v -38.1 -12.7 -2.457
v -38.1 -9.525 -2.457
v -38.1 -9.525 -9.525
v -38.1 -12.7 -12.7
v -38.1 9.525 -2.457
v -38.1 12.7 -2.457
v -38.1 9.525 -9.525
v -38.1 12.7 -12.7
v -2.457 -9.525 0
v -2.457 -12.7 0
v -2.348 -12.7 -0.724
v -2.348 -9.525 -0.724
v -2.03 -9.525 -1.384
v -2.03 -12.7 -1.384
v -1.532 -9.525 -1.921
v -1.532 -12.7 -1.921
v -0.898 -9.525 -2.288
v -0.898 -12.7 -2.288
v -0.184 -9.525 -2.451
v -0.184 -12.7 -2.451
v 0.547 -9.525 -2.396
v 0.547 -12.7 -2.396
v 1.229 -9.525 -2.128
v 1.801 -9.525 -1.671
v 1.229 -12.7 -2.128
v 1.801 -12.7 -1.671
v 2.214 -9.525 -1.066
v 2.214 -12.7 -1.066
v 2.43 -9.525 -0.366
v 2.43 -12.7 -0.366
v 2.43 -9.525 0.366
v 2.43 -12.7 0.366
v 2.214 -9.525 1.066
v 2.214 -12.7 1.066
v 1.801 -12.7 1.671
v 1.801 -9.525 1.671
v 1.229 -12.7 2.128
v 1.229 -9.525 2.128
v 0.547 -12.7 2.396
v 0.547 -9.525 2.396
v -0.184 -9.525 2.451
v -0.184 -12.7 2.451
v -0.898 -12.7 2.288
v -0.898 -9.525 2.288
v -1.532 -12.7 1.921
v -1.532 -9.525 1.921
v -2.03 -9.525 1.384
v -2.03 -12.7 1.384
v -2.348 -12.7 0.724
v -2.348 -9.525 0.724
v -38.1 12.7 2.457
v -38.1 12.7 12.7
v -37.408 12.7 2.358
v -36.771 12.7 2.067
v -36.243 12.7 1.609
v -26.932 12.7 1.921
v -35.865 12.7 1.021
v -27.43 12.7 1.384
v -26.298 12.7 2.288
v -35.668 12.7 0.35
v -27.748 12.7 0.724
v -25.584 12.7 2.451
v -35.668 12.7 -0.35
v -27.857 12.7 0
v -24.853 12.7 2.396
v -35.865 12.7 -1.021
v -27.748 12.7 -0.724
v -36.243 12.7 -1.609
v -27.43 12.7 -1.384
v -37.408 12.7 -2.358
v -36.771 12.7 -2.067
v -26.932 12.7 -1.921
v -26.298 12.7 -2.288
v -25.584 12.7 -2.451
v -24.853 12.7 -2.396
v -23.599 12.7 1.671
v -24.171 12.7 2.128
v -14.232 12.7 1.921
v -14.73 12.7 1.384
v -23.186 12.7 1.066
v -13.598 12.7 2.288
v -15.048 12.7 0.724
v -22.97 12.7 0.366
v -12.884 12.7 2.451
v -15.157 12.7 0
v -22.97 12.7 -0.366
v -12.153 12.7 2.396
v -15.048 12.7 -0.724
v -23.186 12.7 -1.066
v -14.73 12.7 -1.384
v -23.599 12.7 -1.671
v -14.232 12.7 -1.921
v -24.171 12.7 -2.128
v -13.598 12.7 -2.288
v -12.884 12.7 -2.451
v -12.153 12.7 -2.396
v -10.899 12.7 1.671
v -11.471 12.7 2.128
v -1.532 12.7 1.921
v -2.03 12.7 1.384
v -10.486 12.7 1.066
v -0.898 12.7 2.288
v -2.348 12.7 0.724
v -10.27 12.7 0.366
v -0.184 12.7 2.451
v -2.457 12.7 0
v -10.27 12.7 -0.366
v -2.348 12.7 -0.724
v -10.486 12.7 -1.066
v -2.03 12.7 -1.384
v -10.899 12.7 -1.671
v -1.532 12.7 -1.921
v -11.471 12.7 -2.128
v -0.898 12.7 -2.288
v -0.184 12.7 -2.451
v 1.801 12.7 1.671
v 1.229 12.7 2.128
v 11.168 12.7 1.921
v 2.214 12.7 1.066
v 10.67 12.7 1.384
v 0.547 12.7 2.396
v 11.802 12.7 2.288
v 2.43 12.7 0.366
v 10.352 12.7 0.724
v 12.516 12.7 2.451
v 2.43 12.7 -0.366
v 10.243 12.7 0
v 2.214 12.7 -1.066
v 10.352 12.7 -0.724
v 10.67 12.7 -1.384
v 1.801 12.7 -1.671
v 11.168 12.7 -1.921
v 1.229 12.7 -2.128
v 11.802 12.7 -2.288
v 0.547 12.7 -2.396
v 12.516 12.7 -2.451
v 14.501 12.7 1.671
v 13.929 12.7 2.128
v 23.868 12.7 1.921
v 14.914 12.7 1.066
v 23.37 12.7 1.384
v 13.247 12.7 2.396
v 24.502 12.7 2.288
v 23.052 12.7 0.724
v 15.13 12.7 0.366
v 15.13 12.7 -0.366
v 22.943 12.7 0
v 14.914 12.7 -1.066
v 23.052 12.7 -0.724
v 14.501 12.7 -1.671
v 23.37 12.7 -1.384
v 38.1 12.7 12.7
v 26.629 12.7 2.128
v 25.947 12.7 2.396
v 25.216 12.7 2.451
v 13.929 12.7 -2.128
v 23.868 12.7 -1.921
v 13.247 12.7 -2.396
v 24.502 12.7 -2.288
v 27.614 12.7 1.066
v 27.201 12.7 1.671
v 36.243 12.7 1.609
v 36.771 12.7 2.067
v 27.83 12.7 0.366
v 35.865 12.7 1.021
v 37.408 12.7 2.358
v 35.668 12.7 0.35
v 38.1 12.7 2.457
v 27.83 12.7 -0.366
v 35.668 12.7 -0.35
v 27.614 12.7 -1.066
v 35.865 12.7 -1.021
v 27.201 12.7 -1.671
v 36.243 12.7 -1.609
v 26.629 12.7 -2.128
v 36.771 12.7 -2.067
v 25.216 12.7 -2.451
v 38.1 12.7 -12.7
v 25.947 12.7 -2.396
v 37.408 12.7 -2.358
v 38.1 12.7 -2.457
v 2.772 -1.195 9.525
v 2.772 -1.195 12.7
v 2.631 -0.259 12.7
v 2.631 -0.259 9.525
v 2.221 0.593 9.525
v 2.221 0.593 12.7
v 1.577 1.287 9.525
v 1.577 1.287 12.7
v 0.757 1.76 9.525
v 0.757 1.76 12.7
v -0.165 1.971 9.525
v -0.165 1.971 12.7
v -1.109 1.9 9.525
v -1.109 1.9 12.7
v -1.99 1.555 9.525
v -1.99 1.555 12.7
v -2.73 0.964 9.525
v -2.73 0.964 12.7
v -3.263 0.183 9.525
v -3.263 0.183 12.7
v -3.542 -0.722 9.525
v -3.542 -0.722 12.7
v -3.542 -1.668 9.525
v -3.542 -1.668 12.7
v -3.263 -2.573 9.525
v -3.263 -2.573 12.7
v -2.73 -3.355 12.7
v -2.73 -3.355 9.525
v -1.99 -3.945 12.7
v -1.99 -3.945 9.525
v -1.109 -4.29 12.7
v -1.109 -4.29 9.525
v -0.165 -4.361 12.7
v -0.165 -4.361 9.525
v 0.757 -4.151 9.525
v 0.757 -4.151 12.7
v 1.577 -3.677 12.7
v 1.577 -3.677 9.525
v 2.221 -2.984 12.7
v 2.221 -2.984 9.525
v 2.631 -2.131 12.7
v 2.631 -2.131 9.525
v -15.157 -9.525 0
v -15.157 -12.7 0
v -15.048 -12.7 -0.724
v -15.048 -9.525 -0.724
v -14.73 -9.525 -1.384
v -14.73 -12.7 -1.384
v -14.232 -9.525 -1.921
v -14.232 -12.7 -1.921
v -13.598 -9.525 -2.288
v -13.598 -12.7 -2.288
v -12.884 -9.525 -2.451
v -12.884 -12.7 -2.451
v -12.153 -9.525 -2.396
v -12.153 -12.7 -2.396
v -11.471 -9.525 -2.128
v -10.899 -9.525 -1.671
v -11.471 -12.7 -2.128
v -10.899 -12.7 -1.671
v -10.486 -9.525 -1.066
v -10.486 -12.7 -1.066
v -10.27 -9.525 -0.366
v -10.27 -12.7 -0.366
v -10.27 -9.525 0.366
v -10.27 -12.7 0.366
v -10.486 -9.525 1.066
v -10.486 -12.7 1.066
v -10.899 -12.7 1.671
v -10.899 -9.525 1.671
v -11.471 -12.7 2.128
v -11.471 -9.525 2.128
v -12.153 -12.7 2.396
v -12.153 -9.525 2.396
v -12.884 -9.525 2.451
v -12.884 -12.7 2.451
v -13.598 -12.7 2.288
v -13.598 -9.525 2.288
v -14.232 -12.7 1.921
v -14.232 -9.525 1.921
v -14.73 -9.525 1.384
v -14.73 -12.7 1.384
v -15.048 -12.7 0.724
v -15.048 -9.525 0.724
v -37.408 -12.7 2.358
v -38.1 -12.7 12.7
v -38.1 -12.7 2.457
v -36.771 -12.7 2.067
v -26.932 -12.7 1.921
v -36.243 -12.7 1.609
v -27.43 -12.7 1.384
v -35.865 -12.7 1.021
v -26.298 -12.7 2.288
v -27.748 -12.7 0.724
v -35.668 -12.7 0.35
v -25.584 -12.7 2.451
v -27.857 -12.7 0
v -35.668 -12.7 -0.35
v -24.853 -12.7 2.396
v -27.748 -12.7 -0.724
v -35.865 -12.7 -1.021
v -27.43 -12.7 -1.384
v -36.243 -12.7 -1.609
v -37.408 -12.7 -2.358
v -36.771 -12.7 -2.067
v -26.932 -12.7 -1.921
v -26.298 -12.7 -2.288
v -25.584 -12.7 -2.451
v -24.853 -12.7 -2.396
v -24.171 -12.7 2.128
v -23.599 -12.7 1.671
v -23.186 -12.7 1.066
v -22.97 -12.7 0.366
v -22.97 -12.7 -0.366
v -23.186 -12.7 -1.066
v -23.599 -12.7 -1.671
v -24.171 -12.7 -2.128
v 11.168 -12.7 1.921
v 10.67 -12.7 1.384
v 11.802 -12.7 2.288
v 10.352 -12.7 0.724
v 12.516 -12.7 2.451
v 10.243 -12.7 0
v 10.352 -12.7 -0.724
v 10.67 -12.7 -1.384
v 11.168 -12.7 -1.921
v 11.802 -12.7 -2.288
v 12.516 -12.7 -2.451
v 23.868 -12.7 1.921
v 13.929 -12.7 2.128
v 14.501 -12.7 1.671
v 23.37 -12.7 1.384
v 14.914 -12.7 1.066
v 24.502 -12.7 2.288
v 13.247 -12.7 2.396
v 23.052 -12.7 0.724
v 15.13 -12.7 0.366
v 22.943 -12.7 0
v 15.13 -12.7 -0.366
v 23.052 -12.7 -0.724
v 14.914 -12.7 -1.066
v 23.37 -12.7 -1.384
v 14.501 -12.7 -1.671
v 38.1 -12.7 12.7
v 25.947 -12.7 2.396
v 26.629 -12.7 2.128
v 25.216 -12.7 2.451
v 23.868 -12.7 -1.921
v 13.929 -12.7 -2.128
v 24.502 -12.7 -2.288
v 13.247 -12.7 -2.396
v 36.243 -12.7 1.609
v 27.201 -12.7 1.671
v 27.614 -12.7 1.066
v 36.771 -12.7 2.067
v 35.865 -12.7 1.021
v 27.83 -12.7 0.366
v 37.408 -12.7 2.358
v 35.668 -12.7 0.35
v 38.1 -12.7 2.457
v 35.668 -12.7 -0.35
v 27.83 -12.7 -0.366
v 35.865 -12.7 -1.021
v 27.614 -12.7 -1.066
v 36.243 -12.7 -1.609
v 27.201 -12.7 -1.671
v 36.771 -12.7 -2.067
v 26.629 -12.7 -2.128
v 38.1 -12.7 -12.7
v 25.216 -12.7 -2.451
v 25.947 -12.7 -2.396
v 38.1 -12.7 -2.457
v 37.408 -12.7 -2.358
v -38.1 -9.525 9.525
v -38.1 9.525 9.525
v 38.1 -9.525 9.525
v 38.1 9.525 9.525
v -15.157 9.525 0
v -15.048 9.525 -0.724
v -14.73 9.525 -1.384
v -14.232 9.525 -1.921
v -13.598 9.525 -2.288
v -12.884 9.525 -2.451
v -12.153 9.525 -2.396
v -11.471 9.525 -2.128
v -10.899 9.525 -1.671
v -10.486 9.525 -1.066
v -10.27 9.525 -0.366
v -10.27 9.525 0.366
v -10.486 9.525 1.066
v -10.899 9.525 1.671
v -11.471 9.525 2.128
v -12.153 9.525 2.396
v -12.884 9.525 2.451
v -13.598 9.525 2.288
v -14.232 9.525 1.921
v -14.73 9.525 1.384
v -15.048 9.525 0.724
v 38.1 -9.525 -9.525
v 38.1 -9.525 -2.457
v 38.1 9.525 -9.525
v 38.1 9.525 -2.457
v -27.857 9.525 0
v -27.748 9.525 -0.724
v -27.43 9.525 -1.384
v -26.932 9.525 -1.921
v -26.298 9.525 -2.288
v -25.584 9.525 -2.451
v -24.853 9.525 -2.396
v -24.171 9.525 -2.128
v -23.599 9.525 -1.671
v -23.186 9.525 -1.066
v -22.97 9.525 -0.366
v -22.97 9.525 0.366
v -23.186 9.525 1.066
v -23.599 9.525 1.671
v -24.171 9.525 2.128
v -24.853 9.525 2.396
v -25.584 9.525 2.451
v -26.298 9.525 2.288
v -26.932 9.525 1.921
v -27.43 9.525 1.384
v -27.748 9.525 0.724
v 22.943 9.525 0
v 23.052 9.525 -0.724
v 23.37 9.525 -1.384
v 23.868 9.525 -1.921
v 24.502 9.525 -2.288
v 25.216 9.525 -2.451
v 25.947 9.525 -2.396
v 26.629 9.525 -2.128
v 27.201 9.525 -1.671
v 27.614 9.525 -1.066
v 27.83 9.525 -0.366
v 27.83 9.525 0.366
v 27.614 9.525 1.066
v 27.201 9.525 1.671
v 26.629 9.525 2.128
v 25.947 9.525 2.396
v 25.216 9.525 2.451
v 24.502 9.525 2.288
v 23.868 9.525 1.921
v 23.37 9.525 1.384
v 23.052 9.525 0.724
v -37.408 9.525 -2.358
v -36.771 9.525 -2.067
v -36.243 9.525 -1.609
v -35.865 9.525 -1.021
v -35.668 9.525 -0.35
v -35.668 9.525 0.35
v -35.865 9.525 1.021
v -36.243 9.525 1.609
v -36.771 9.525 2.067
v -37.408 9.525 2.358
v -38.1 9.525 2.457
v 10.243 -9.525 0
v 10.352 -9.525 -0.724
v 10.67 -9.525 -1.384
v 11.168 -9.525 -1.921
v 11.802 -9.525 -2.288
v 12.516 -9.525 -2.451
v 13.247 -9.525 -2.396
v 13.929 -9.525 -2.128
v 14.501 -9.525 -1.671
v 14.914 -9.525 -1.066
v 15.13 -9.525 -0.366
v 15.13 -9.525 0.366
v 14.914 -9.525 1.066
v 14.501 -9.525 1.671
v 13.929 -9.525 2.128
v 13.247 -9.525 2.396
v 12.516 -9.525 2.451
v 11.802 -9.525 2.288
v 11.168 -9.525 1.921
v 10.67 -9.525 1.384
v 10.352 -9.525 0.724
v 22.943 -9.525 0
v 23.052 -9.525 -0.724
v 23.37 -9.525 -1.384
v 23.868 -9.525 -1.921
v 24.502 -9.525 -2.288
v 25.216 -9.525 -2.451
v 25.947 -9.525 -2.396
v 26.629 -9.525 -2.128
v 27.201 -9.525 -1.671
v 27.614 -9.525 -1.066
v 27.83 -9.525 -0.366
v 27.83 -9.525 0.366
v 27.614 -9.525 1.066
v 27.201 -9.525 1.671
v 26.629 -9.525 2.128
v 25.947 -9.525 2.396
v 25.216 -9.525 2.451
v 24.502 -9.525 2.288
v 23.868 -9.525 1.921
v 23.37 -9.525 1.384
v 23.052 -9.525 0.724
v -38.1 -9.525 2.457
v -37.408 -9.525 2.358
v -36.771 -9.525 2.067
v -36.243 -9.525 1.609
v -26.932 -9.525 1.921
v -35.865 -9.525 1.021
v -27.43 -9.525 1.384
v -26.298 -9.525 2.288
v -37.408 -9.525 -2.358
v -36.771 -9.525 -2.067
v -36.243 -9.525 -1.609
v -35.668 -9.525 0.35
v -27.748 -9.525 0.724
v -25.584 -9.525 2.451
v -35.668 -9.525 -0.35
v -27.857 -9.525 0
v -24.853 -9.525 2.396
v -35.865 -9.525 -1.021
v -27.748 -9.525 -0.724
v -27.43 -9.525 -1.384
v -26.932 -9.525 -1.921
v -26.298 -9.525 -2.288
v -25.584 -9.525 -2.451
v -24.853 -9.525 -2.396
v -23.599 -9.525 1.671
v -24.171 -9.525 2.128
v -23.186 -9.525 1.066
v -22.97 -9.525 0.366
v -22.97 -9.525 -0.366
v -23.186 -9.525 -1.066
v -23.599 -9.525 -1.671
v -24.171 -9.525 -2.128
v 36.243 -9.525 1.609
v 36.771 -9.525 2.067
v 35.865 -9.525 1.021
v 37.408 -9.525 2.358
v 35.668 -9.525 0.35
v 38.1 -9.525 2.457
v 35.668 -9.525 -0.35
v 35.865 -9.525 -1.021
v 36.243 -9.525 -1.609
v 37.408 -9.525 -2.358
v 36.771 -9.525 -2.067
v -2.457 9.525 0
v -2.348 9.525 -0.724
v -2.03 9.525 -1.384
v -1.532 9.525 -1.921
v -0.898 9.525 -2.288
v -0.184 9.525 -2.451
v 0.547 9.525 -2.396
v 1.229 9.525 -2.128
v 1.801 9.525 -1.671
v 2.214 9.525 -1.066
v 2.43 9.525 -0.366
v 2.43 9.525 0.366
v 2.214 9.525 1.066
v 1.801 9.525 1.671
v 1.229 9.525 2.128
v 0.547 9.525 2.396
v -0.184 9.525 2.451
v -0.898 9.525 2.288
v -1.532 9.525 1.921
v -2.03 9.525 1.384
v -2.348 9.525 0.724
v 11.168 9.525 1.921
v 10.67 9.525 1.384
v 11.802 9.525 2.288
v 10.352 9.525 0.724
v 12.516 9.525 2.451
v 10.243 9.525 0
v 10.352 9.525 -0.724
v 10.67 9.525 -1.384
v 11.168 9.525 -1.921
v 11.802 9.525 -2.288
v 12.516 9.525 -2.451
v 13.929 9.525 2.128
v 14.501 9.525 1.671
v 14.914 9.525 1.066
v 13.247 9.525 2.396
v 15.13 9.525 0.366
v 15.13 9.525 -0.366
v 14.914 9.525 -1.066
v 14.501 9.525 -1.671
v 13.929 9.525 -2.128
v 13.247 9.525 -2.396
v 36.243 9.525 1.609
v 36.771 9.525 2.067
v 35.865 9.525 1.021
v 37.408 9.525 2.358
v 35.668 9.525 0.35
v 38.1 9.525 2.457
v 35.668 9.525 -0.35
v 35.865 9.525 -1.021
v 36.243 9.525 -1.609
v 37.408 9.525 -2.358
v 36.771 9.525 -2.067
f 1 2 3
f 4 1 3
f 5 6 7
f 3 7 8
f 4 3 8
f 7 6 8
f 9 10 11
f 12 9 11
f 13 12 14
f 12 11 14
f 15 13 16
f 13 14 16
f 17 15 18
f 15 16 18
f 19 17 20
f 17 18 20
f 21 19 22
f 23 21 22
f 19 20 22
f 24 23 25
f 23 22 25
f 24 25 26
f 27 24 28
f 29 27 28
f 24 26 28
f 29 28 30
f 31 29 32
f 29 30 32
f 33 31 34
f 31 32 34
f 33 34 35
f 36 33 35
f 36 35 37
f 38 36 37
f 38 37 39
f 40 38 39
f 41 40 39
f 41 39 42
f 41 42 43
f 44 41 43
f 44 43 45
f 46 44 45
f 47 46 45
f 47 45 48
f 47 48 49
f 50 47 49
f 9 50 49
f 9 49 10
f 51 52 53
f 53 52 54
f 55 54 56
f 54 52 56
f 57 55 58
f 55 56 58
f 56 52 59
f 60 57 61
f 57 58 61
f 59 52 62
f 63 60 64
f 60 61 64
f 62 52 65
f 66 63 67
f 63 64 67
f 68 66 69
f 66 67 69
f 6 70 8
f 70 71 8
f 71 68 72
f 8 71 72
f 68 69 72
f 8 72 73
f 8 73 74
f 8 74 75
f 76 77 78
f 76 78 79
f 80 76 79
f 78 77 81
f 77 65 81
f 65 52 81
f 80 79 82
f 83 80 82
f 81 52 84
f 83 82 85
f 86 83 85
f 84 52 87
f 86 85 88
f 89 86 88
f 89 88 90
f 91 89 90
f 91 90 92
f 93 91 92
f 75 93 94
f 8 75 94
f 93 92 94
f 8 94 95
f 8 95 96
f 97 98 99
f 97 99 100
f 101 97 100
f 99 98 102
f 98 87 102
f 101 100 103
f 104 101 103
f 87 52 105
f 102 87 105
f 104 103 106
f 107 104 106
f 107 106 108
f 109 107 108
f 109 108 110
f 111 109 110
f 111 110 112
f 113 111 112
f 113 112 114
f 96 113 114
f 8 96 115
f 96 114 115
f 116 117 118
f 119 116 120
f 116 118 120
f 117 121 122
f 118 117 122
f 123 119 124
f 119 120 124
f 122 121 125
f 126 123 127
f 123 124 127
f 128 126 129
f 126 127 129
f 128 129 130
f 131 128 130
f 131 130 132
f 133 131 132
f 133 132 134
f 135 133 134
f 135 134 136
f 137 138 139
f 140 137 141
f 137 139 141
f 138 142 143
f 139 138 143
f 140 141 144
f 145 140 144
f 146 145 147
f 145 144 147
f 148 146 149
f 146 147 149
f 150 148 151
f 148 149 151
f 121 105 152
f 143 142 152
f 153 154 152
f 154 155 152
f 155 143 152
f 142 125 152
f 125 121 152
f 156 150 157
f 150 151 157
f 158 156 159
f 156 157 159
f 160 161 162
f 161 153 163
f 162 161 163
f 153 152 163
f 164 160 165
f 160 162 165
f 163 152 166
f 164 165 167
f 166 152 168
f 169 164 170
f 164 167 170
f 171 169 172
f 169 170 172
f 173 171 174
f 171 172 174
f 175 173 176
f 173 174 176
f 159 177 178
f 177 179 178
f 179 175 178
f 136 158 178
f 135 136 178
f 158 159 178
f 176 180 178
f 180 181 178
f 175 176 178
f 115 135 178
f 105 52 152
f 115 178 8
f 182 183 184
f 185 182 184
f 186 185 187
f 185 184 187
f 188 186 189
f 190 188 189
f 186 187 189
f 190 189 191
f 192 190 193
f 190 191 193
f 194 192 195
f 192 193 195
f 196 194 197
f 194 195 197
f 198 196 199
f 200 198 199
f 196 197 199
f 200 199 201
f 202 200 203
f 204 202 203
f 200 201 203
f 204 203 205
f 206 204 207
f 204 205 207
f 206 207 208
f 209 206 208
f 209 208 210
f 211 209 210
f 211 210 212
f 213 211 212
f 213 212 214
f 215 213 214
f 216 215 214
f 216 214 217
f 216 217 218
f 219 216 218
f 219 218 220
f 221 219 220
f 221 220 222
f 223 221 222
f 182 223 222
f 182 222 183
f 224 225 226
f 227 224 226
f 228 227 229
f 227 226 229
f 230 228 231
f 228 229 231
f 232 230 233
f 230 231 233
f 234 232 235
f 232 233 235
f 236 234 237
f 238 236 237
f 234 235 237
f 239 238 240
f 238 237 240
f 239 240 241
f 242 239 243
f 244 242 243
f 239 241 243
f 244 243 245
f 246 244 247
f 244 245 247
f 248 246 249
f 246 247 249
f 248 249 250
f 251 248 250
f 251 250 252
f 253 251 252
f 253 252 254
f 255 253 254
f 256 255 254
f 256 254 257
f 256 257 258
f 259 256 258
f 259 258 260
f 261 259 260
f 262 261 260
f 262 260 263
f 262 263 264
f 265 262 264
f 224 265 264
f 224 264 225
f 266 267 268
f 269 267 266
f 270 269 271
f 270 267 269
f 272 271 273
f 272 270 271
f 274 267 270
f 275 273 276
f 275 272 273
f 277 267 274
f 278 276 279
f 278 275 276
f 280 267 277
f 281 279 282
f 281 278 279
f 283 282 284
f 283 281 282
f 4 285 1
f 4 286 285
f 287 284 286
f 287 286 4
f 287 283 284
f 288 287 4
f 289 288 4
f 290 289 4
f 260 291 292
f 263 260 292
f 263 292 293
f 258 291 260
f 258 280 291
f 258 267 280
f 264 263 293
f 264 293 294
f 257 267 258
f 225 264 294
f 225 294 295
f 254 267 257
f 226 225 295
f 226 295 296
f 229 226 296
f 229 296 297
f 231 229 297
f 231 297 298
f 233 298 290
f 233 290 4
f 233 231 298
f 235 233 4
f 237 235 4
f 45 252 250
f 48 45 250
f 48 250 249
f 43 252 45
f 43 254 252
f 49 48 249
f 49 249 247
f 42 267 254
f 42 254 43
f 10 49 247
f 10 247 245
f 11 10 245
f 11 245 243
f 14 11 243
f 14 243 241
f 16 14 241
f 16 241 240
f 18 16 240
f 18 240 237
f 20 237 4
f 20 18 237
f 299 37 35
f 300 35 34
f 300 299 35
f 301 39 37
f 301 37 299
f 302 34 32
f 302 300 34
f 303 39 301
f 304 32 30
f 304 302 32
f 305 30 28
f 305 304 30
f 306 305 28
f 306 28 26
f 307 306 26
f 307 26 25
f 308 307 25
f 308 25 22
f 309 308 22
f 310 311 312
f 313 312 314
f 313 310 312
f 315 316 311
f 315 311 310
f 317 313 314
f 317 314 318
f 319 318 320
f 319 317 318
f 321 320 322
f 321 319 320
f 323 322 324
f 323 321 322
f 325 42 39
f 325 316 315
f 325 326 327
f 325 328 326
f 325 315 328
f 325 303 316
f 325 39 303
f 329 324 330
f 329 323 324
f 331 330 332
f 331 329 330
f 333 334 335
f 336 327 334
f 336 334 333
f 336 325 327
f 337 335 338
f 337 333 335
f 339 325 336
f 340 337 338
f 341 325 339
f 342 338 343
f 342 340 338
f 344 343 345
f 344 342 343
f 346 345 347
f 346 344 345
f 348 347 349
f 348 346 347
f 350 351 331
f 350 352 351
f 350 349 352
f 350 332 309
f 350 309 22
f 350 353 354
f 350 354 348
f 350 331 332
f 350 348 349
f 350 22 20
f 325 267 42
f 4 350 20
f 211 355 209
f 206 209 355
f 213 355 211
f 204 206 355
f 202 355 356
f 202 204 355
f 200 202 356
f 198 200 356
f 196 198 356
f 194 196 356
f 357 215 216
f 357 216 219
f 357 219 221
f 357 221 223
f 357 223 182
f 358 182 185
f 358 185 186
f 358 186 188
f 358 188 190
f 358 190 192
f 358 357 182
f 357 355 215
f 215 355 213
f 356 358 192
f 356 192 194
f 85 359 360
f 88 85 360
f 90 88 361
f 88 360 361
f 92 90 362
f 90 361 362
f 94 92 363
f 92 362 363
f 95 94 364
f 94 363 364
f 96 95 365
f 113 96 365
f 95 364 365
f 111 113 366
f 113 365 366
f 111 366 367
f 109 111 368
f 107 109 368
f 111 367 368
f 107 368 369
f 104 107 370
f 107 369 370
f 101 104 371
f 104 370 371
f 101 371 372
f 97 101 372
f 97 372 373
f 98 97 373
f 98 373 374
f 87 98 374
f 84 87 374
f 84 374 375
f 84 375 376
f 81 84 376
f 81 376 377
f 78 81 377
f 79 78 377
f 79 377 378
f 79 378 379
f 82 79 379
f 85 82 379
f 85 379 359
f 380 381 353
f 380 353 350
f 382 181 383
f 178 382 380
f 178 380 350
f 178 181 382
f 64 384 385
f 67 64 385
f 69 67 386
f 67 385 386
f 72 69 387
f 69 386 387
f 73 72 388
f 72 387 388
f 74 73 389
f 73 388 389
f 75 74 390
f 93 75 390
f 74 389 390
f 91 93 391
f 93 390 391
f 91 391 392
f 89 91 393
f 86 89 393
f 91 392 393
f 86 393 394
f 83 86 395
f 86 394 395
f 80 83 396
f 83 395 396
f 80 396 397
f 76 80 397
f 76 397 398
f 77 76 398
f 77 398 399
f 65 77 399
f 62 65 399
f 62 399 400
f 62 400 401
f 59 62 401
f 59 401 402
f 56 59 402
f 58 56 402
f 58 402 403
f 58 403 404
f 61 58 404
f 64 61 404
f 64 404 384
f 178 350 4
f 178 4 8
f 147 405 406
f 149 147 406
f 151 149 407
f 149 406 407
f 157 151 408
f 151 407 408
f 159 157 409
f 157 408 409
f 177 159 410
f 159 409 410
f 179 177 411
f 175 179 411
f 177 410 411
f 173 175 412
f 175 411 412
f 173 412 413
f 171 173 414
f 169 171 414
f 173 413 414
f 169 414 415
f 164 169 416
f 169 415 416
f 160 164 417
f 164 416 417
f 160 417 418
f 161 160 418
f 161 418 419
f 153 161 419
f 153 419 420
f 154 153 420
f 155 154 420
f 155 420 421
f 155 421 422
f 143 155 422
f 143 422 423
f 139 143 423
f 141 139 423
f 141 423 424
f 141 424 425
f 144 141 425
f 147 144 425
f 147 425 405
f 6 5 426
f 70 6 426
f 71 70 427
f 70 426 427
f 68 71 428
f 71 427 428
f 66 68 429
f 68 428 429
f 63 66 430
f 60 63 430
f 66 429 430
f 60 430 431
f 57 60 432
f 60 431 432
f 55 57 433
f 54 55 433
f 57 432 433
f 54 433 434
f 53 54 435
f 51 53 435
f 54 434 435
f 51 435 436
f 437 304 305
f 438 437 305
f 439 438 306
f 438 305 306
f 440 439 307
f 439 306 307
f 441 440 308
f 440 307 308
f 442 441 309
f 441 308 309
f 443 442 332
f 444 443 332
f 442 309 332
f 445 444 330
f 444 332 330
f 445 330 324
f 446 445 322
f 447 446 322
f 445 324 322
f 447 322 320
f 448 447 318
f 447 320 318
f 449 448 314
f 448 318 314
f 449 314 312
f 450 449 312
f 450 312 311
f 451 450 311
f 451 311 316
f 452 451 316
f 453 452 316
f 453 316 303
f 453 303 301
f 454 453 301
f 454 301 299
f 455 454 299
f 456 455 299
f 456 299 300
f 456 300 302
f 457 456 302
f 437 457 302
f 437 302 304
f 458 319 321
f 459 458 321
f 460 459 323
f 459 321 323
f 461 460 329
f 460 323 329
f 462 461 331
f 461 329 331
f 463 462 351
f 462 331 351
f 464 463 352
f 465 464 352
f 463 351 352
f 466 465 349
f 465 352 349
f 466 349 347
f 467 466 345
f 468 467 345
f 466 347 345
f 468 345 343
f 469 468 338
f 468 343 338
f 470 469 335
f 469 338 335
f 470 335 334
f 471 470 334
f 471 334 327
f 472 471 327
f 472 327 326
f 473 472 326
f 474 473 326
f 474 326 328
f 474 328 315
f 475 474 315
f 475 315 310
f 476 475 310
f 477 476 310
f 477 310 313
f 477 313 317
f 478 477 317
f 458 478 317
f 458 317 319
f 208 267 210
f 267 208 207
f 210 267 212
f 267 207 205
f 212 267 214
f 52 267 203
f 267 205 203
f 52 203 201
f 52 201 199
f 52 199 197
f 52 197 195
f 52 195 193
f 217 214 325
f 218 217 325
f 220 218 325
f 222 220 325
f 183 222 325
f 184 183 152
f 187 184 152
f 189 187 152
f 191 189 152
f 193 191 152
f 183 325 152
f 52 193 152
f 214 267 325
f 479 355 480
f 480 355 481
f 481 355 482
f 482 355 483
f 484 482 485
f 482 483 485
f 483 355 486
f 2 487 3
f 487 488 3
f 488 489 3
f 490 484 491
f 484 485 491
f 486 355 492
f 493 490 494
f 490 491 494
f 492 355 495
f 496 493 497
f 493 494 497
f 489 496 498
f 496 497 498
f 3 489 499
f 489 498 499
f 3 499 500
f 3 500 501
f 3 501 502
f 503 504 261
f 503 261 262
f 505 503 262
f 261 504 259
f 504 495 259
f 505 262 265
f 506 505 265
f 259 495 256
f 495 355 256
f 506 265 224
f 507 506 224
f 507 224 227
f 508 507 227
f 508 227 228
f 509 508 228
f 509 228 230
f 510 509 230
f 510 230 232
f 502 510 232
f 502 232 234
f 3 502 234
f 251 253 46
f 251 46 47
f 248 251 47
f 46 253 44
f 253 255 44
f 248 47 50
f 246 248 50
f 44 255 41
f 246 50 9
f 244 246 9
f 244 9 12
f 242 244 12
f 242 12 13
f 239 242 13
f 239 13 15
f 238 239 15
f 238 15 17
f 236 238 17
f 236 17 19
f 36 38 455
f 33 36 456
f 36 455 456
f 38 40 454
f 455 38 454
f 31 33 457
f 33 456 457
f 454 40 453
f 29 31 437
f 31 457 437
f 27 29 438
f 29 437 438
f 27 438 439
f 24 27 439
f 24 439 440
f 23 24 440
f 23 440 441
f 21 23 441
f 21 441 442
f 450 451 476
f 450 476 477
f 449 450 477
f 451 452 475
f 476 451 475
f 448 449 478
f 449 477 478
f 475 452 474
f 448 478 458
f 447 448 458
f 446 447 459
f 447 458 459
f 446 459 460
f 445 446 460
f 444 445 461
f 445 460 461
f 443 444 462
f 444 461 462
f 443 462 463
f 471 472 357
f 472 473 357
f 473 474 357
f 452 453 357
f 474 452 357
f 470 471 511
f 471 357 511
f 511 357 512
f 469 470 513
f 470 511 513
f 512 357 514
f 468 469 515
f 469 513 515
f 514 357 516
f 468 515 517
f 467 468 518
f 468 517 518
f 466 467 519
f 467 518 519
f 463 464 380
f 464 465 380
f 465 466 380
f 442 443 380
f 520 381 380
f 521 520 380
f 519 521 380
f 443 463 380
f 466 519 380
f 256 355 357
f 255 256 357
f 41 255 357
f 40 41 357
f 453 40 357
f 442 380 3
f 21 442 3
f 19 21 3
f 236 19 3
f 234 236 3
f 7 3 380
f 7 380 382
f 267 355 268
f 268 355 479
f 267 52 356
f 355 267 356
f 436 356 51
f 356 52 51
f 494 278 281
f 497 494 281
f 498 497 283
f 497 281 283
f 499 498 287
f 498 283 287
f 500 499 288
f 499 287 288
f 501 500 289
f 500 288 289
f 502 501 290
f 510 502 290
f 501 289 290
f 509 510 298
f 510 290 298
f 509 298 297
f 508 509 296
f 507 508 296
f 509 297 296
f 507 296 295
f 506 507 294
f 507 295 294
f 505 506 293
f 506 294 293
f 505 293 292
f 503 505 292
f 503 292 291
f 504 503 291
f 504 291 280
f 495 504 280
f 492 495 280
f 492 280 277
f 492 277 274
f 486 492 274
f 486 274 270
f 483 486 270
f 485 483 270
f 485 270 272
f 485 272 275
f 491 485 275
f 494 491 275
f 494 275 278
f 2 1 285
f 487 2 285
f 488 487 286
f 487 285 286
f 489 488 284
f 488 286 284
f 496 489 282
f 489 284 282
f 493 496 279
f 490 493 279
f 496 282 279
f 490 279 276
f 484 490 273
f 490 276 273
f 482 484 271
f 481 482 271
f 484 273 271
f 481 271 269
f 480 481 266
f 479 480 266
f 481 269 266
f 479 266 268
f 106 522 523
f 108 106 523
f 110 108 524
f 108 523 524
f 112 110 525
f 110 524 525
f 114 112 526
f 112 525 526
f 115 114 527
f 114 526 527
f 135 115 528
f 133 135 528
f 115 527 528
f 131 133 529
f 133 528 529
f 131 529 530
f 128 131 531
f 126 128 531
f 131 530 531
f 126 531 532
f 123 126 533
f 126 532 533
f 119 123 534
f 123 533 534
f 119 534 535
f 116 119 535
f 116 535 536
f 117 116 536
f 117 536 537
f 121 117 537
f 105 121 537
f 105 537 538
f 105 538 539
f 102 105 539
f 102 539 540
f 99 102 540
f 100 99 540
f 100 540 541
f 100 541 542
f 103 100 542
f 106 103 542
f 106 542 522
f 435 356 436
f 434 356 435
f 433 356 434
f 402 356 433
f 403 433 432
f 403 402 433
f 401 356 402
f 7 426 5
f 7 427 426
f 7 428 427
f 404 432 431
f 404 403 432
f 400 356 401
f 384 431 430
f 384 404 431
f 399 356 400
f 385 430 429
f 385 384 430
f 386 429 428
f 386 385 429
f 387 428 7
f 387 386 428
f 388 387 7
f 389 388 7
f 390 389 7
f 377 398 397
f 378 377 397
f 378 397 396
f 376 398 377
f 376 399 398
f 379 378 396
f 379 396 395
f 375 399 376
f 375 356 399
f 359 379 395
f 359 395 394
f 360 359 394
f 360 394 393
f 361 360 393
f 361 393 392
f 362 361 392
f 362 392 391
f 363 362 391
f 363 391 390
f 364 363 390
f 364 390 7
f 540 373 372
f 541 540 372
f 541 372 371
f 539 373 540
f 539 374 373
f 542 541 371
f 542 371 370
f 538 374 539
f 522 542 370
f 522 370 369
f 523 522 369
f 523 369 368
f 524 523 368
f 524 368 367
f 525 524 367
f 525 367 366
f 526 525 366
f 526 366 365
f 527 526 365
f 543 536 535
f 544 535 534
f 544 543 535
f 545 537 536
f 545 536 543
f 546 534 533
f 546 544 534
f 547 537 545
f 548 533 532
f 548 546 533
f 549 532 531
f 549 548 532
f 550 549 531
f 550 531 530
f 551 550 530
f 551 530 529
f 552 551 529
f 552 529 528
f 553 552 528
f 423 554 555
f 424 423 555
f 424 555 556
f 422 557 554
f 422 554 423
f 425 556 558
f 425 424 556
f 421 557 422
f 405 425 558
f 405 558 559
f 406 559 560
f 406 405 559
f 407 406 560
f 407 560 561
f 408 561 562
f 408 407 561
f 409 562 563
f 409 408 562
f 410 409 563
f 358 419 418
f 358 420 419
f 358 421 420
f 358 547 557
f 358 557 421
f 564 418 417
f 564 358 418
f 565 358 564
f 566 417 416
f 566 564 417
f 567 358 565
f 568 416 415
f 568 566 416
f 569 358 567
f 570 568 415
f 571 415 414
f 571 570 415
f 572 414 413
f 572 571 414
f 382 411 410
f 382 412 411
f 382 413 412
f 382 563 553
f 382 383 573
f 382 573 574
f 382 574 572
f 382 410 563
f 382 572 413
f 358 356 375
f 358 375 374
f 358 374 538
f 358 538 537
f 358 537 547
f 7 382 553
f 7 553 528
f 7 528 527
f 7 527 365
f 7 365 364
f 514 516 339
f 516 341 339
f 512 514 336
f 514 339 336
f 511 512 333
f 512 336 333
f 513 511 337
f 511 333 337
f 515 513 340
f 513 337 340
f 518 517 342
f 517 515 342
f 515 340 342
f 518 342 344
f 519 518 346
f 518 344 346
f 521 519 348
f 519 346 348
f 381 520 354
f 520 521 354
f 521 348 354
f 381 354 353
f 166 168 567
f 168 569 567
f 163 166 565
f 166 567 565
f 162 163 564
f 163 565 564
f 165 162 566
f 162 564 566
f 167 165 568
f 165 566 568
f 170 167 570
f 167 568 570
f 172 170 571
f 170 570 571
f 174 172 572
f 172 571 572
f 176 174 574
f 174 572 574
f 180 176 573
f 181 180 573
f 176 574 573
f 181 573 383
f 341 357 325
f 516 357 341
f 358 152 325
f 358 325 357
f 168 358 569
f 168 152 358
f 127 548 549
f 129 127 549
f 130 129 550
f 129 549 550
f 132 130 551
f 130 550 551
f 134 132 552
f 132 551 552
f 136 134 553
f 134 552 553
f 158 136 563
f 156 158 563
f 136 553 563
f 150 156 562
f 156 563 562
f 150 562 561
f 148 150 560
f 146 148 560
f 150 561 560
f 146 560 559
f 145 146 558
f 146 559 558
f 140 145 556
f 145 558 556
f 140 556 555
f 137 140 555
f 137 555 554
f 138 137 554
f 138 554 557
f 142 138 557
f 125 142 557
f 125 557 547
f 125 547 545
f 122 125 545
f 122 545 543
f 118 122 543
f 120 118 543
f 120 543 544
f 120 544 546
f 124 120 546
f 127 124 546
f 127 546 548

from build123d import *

# Parameters (mm, degrees)
SKETCH1_W                   = 25.4
SKETCH1_H                   = 25.4
SKETCH1_W_2                 = 19.05
SKETCH1_H_2                 = 19.05
BASE_TUBE_DEPTH             = 38.1
INITIAL_10_HOLE_D           = 4.9149
F_10_HOLE_PATTERN_COUNT     = 4
F_10_HOLE_PATTERN_PITCH     = 12.7
F_10_HOLE_PATTERN_COL_COUNT = 4
F_10_HOLE_PATTERN_COL_PITCH = 12.7
CUT_EXTRUDE1_REACH          = 49.519
SKETCH8_R                   = 3.175


with BuildPart() as part:
    # Sketch1 → Base Tube (new, symmetric)
    with BuildSketch(Plane(origin=(0, 0, 0), x_dir=(0, 0, -1), z_dir=(1, 0, 0))):
        Rectangle(SKETCH1_W, SKETCH1_H)
        Rectangle(SKETCH1_W_2, SKETCH1_H_2, mode=Mode.SUBTRACT)
    extrude(amount=BASE_TUBE_DEPTH, both=True)

    # Initial #10 Hole (through all)
    with Locations(Plane(origin=(0, 12.7, 0), x_dir=(1, 0, 0), z_dir=(0, 1, 0))):
        with Locations((0, 0)):
            initial_10_hole = Hole(INITIAL_10_HOLE_D / 2)

    # #10 Hole Pattern: Initial #10 Hole ×4
    with Locations(*[(i * F_10_HOLE_PATTERN_PITCH, 0, 0) for i in range(1, F_10_HOLE_PATTERN_COUNT)]):
        add(initial_10_hole, mode=Mode.SUBTRACT)

    # #10 Hole Pattern col: Initial #10 Hole ×4
    with Locations(*[(-i * F_10_HOLE_PATTERN_COL_PITCH, 0, 0) for i in range(1, F_10_HOLE_PATTERN_COL_COUNT)]):
        add(initial_10_hole, mode=Mode.SUBTRACT)

    # Sketch8 → Cut-Extrude1 (cut, up to next)
    with BuildSketch(Plane.XY.offset(12.7), mode=Mode.PRIVATE) as cut_extrude1_sk1:
        with Locations((-0.402530278, -1.19507)):
            Circle(SKETCH8_R)
    cut_extrude1_tool1 = extrude(cut_extrude1_sk1.sketch, amount=-CUT_EXTRUDE1_REACH, mode=Mode.PRIVATE) & part.part
    add(cut_extrude1_tool1.solids().sort_by_distance((-0.40253, -1.19507, 12.7))[0], mode=Mode.SUBTRACT)


solid = part.part
